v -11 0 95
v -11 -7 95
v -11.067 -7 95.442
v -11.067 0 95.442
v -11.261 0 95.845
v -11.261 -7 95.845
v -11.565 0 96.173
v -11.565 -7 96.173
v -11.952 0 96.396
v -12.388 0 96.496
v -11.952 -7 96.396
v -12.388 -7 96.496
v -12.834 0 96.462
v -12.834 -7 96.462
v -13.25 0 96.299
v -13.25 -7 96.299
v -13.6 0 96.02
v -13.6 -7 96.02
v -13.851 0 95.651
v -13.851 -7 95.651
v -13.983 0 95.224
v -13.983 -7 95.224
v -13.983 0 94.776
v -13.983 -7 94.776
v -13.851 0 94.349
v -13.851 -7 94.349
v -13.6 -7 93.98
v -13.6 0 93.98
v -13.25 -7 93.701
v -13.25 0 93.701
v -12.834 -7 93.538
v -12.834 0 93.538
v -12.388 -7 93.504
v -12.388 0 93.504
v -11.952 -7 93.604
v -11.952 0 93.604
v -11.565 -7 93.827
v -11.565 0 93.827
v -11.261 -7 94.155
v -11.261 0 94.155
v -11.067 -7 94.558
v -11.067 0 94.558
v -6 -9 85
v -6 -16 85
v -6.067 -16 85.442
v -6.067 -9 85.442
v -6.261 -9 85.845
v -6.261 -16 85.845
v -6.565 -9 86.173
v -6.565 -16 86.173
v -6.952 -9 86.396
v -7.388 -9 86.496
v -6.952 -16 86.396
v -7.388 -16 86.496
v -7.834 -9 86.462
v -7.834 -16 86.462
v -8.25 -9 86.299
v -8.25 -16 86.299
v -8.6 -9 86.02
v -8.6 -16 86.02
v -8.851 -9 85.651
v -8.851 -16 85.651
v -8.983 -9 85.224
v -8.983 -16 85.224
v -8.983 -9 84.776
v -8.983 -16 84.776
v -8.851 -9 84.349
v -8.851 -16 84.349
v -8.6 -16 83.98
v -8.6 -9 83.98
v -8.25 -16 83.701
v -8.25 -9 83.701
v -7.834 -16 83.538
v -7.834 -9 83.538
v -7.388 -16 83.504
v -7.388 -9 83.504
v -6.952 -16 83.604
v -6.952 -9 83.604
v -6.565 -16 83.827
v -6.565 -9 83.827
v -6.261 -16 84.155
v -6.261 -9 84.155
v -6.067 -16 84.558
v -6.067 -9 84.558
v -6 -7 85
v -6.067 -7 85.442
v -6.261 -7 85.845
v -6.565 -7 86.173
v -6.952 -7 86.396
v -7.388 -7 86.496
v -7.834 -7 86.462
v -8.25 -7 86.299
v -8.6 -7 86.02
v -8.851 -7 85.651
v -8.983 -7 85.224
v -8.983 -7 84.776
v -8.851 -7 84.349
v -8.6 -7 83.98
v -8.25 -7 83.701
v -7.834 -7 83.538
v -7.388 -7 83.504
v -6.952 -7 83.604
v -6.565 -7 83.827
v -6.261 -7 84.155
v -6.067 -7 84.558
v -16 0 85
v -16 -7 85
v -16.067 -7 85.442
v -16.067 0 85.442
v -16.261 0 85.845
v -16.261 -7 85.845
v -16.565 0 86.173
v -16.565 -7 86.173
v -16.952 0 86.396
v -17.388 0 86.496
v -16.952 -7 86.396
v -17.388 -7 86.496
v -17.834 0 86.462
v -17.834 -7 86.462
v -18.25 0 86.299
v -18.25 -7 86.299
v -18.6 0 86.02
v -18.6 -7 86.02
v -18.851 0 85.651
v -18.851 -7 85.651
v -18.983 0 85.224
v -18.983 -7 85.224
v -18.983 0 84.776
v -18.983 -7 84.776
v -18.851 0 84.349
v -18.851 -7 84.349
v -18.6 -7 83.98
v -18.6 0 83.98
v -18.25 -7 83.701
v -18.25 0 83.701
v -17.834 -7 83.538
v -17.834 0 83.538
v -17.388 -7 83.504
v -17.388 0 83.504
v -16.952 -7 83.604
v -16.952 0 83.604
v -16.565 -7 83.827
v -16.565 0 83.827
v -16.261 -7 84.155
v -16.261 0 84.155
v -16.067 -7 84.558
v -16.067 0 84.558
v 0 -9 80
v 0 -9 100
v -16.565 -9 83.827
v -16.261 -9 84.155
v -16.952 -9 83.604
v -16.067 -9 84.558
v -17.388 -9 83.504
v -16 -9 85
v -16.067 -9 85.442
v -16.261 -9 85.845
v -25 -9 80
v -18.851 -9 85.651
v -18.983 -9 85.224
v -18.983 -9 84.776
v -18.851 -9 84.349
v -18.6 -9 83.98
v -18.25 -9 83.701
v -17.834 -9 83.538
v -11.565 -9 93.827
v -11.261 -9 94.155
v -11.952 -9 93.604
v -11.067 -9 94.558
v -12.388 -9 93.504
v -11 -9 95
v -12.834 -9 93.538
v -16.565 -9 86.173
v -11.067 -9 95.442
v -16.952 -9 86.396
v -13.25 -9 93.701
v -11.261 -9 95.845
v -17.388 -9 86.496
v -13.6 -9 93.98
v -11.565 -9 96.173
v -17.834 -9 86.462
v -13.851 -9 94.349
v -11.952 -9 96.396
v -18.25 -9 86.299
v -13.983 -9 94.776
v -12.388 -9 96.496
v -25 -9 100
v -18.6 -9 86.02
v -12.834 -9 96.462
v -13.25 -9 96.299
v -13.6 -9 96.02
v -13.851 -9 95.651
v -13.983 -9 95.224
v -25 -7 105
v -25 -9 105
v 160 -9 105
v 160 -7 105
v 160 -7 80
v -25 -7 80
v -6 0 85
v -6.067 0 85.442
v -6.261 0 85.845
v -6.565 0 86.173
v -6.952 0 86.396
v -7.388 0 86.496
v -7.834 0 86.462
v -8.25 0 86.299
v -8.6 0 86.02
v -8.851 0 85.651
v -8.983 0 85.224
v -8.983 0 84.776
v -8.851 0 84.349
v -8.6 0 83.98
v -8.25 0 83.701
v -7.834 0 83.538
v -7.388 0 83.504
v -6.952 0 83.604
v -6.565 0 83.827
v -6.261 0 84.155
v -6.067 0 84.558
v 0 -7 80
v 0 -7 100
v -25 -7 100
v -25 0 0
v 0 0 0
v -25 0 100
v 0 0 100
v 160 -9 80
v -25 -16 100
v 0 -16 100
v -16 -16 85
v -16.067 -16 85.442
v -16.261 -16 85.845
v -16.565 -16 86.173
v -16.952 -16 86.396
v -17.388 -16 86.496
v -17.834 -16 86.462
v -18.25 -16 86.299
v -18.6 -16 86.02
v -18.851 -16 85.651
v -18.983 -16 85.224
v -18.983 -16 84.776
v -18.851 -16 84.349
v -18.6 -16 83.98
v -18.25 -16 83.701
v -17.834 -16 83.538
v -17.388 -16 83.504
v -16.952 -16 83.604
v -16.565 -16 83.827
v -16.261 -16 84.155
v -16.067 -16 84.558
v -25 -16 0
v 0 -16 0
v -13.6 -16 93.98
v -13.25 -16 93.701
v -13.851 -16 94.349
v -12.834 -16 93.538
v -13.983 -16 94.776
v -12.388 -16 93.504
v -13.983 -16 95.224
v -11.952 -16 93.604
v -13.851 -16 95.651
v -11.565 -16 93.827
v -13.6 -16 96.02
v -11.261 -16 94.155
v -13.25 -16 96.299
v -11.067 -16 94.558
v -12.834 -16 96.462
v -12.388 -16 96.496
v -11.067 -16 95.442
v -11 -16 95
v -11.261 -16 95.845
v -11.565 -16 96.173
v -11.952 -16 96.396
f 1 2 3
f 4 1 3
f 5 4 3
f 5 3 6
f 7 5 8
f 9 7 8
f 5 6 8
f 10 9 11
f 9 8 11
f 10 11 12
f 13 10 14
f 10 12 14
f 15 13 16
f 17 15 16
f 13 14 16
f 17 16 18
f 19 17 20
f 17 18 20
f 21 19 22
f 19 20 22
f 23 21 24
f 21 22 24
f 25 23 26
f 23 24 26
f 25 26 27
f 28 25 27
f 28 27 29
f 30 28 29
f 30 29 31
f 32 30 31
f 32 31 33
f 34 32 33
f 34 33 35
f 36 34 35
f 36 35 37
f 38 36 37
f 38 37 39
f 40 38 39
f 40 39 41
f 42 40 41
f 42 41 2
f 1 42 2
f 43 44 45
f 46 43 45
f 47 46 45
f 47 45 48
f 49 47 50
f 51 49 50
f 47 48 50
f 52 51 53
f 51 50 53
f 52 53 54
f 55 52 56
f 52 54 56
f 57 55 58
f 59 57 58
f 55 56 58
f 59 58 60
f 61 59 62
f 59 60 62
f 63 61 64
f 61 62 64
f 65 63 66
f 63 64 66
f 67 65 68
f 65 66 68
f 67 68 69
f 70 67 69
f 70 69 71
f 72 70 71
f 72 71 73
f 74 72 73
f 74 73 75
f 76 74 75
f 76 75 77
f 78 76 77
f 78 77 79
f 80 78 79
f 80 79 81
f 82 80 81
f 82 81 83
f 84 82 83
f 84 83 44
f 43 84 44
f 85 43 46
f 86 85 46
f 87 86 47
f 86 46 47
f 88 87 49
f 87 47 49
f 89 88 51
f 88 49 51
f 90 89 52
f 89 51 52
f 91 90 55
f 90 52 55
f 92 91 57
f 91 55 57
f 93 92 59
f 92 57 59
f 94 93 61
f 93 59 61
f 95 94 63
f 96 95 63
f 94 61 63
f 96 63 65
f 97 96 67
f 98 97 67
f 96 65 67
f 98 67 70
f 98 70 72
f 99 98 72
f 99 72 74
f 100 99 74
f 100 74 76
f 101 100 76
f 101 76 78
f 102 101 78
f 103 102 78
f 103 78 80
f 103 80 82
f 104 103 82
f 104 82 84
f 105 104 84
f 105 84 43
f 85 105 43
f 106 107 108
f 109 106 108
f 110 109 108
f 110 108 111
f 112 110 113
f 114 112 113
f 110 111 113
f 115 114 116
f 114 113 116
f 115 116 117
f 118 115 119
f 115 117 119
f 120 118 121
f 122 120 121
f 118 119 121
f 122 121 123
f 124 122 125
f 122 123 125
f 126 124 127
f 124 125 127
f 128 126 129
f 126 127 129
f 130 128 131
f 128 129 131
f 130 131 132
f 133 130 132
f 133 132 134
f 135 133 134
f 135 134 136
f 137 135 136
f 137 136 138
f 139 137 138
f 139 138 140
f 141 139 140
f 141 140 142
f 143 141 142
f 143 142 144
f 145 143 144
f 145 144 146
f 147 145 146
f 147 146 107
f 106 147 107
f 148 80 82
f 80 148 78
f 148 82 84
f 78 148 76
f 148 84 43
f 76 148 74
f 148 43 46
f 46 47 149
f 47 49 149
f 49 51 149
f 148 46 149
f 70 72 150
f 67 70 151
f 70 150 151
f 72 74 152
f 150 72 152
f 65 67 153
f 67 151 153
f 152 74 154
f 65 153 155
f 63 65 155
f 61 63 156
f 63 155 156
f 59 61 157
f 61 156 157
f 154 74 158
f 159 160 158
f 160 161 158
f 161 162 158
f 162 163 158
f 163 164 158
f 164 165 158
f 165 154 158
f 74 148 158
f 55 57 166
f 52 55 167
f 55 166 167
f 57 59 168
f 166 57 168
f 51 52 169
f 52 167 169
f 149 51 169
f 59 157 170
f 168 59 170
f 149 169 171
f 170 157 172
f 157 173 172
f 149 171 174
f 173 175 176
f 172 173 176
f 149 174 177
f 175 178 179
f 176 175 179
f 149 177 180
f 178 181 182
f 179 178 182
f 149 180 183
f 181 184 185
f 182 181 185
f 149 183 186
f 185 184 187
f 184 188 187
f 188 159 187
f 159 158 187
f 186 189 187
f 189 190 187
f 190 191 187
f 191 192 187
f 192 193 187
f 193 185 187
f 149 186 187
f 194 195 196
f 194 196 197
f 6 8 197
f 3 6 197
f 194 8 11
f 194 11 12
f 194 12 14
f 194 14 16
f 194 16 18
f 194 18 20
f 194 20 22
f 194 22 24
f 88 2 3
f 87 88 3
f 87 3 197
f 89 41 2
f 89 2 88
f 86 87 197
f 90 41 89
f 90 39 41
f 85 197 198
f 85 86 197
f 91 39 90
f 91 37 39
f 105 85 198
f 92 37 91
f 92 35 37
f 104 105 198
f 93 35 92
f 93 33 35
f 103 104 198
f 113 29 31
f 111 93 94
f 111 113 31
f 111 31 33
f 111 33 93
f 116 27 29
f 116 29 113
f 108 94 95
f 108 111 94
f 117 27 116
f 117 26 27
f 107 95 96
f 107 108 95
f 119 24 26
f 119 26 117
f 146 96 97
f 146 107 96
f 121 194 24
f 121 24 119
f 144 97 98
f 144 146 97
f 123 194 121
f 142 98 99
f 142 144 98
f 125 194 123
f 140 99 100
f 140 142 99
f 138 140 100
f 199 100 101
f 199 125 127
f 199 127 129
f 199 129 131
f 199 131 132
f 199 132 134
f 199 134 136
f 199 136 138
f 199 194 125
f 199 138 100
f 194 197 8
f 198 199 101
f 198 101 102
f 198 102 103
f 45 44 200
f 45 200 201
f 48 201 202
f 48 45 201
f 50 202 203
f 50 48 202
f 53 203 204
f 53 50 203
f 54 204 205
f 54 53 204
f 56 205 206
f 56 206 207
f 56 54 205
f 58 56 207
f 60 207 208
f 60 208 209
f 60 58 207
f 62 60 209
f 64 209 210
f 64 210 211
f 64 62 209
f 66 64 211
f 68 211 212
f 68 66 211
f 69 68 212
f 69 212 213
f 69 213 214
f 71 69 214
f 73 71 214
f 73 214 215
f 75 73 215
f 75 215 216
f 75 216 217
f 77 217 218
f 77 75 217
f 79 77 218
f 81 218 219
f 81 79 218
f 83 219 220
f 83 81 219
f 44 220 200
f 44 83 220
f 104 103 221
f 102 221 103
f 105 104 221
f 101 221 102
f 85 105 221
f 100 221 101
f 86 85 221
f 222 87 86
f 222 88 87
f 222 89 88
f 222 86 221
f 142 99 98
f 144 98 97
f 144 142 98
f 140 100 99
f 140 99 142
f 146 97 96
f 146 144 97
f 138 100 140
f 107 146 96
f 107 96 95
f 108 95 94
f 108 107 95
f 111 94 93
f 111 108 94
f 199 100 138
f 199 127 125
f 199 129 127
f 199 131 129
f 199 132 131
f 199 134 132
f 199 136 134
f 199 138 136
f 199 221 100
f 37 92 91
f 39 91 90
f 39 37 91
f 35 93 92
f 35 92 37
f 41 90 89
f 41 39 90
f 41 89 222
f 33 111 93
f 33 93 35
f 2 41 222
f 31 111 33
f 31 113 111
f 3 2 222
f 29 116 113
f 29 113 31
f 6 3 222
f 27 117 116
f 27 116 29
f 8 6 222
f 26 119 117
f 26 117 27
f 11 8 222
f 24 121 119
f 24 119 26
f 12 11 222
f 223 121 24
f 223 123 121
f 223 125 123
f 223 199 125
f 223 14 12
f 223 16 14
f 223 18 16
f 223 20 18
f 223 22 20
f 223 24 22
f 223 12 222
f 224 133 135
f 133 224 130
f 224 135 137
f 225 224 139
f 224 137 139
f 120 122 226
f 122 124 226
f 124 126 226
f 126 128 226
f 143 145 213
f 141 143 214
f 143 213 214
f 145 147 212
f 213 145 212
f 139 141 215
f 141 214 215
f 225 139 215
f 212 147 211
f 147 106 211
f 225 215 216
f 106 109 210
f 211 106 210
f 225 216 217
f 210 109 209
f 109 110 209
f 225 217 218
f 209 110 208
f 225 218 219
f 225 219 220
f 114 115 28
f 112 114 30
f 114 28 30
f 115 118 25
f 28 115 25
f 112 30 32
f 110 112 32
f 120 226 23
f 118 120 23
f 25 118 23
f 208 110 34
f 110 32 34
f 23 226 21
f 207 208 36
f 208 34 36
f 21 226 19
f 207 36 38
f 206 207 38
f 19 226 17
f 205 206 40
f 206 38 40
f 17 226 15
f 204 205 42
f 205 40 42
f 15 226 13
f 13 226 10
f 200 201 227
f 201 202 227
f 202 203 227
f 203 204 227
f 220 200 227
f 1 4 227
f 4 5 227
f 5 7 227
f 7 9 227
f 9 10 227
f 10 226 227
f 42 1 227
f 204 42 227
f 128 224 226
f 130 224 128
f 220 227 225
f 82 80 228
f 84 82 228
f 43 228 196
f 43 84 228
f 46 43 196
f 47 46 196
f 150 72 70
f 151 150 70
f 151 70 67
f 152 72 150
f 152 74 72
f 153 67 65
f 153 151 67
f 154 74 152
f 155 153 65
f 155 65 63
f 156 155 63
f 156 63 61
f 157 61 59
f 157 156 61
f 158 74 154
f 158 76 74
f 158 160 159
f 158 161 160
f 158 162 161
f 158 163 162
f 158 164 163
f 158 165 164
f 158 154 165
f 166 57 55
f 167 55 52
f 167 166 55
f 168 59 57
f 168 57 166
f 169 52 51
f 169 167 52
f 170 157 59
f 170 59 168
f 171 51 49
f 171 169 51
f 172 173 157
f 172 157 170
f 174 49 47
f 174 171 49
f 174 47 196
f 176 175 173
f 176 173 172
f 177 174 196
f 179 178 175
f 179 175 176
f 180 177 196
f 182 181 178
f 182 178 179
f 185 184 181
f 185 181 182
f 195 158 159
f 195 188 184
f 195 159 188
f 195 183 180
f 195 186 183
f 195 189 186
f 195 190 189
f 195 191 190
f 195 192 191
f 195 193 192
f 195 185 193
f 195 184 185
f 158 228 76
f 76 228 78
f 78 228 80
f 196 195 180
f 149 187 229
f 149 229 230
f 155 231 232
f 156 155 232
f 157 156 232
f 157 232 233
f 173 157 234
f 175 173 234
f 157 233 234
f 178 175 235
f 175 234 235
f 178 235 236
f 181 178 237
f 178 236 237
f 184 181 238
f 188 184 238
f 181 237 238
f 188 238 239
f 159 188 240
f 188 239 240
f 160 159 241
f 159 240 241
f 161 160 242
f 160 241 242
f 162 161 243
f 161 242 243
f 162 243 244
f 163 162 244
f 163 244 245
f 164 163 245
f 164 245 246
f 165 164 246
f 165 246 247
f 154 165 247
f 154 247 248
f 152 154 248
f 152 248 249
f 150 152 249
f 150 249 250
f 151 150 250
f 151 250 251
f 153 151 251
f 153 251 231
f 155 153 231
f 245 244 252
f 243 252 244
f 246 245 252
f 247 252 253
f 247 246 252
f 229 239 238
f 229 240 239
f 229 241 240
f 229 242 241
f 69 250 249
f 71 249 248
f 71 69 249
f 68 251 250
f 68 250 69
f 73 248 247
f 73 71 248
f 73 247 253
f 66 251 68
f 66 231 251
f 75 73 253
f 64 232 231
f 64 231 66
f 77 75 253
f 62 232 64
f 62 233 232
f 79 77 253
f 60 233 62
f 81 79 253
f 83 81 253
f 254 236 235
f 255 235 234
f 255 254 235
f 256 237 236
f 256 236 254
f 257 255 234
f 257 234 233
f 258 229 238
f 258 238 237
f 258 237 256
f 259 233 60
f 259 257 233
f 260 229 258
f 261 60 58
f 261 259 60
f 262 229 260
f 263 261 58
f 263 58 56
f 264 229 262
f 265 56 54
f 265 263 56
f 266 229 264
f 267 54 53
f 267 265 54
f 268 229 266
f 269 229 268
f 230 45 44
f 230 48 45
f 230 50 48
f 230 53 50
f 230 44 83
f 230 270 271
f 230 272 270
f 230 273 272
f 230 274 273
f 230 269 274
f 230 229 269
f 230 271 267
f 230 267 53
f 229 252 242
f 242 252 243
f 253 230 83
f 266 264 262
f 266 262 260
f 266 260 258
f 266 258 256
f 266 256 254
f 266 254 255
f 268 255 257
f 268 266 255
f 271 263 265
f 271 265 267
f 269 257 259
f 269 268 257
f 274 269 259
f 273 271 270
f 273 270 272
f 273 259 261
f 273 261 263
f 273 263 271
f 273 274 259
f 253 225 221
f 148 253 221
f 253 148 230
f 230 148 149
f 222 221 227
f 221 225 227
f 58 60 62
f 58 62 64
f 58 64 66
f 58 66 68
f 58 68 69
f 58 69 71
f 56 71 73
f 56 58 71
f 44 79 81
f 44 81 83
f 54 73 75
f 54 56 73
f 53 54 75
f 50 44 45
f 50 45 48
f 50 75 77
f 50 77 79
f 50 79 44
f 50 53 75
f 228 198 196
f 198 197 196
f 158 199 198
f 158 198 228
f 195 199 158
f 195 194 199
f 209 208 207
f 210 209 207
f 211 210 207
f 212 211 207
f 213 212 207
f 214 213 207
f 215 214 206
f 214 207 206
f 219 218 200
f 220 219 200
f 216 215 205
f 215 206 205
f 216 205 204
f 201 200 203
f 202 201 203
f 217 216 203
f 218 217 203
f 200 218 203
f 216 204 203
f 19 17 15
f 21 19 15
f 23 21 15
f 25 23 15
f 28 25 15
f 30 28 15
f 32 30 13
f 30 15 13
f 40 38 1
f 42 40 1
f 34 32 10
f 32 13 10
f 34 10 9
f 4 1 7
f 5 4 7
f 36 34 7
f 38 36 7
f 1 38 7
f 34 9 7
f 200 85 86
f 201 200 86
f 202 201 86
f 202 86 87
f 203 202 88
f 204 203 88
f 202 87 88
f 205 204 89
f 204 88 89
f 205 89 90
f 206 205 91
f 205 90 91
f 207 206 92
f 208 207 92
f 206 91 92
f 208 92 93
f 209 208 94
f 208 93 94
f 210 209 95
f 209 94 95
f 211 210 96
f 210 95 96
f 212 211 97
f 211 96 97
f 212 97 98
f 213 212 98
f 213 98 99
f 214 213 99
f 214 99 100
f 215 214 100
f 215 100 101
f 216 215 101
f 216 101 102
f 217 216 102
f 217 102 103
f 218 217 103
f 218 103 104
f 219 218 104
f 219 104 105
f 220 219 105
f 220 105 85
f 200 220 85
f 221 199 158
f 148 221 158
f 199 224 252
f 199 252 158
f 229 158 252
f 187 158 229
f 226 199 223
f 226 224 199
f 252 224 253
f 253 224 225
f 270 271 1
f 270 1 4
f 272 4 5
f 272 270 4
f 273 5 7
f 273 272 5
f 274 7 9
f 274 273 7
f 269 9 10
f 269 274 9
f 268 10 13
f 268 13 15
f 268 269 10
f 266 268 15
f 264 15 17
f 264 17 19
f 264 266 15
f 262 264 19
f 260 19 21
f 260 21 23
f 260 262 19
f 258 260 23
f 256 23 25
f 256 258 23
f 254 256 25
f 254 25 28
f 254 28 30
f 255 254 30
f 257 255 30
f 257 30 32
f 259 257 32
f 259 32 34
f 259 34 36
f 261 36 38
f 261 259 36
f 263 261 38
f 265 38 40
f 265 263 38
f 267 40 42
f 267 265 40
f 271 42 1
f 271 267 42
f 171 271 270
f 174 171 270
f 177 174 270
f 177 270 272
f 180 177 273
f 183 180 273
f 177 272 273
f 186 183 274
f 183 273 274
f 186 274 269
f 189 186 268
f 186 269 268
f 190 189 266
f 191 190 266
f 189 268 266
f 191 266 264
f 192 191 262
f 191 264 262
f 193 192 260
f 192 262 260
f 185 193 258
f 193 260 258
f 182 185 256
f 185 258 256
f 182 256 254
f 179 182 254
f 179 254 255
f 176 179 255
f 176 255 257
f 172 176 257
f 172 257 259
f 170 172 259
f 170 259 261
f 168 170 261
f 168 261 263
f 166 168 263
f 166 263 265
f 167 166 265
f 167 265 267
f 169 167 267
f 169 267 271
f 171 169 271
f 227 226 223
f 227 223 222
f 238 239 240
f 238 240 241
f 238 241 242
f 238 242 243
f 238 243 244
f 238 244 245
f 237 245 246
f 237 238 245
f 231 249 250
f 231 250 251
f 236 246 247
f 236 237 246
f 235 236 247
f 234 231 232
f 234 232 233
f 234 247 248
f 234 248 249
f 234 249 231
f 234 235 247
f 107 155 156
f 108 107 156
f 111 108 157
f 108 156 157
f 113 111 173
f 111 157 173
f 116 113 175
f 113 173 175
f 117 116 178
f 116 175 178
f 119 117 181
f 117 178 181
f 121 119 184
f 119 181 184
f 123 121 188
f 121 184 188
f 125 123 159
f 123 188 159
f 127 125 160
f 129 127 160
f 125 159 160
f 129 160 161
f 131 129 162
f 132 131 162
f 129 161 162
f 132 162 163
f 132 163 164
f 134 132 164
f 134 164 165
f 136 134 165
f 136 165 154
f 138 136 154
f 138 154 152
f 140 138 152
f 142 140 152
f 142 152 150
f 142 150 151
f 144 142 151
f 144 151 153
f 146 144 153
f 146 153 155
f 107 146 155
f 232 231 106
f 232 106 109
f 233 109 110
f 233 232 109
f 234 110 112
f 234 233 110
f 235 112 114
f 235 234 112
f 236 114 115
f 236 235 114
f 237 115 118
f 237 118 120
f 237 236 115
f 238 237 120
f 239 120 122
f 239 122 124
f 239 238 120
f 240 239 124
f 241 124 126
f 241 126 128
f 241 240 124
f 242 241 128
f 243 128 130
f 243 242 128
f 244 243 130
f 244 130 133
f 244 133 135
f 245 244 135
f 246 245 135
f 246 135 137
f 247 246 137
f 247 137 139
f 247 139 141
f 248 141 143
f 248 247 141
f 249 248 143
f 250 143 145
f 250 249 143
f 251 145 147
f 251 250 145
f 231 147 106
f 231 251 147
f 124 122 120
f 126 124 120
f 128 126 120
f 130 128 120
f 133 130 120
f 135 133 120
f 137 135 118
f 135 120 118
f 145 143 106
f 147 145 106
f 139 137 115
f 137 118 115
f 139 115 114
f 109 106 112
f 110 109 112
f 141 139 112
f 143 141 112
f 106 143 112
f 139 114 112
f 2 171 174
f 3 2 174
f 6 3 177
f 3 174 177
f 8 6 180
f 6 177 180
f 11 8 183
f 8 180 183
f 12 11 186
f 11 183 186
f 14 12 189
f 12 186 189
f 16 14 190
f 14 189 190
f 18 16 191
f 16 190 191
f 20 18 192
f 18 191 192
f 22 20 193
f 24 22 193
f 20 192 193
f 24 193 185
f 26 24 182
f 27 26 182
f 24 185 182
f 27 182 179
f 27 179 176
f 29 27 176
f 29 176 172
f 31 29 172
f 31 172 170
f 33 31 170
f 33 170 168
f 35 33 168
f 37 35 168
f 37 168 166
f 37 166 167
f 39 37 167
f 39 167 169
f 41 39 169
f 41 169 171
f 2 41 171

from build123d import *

# Parameters (mm, degrees)
F0_W      = 25
F0_H      = 100
F1_DEPTH  = 16
F2_W      = 2
F2_H      = 20
F3_DEPTH  = 25
F5_DEPTH  = 185
F6_R      = 1.5
F7_DEPTH  = 16
F8_R      = 1.5
F9_DEPTH  = 16
F10_R     = 1.5
F11_DEPTH = 16
F12_R     = 1.5
F13_DEPTH = 16


with BuildPart() as f1:
    # F0 (on Front) → F1 (new body)
    with BuildSketch(Plane.XZ):
        with Locations((-12.5, 50)):
            Rectangle(F0_W, F0_H)
    extrude(amount=F1_DEPTH)

    # F2 (on face) → F3 (cut, through all)
    with BuildSketch(Plane(origin=(-25, 0, 0), x_dir=(0, -1, 0), z_dir=(-1, 0, 0))):
        with Locations((8, 90)):
            Rectangle(F2_W, F2_H)
    extrude(amount=-F3_DEPTH, mode=Mode.SUBTRACT)


with BuildPart() as f5:
    # F4 (on face) → F5 (new body)
    with BuildSketch(Plane(origin=(-25, 0, 0), x_dir=(0, -1, 0), z_dir=(-1, 0, 0))):
        Polygon((7, 100), (7, 80), (9, 80), (9, 100), (9, 105), (7, 105), align=None)
    extrude(amount=-F5_DEPTH)


with BuildPart() as f7_tool:
    # F6 (on face) → F7 (new body, through all)
    with BuildSketch(Plane.XZ.offset(16)):
        with Locations((-7.5, 85)):
            Circle(F6_R)
        with Locations((-12.5, 95)):
            Circle(F6_R)
        with Locations((-17.5, 85)):
            Circle(F6_R)
    extrude(amount=-F7_DEPTH)


with BuildPart() as f1_1:
    add(f1.part)

    # F7: cut by f7_tool
    add(f7_tool.part, mode=Mode.SUBTRACT)


with BuildPart() as f5_1:
    add(f5.part)

    # F7: cut by f7_tool
    add(f7_tool.part, mode=Mode.SUBTRACT)


with BuildPart() as f9:
    # F8 (on face) → F9 (new body, through all)
    with BuildSketch(Plane.XZ.offset(16)):
        with Locations((-12.5, 95)):
            Circle(F8_R)
    extrude(amount=-F9_DEPTH)


with BuildPart() as f11:
    # F10 (on face) → F11 (new body, through all)
    with BuildSketch(Plane.XZ.offset(16)):
        with Locations((-17.5, 85)):
            Circle(F10_R)
    extrude(amount=-F11_DEPTH)


with BuildPart() as f13:
    # F12 (on face) → F13 (new body, through all)
    with BuildSketch(Plane.XZ.offset(16)):
        with Locations((-7.5, 85)):
            Circle(F12_R)
    extrude(amount=-F13_DEPTH)


solid = Compound([f1_1.part, f5_1.part, f9.part, f11.part, f13.part])
